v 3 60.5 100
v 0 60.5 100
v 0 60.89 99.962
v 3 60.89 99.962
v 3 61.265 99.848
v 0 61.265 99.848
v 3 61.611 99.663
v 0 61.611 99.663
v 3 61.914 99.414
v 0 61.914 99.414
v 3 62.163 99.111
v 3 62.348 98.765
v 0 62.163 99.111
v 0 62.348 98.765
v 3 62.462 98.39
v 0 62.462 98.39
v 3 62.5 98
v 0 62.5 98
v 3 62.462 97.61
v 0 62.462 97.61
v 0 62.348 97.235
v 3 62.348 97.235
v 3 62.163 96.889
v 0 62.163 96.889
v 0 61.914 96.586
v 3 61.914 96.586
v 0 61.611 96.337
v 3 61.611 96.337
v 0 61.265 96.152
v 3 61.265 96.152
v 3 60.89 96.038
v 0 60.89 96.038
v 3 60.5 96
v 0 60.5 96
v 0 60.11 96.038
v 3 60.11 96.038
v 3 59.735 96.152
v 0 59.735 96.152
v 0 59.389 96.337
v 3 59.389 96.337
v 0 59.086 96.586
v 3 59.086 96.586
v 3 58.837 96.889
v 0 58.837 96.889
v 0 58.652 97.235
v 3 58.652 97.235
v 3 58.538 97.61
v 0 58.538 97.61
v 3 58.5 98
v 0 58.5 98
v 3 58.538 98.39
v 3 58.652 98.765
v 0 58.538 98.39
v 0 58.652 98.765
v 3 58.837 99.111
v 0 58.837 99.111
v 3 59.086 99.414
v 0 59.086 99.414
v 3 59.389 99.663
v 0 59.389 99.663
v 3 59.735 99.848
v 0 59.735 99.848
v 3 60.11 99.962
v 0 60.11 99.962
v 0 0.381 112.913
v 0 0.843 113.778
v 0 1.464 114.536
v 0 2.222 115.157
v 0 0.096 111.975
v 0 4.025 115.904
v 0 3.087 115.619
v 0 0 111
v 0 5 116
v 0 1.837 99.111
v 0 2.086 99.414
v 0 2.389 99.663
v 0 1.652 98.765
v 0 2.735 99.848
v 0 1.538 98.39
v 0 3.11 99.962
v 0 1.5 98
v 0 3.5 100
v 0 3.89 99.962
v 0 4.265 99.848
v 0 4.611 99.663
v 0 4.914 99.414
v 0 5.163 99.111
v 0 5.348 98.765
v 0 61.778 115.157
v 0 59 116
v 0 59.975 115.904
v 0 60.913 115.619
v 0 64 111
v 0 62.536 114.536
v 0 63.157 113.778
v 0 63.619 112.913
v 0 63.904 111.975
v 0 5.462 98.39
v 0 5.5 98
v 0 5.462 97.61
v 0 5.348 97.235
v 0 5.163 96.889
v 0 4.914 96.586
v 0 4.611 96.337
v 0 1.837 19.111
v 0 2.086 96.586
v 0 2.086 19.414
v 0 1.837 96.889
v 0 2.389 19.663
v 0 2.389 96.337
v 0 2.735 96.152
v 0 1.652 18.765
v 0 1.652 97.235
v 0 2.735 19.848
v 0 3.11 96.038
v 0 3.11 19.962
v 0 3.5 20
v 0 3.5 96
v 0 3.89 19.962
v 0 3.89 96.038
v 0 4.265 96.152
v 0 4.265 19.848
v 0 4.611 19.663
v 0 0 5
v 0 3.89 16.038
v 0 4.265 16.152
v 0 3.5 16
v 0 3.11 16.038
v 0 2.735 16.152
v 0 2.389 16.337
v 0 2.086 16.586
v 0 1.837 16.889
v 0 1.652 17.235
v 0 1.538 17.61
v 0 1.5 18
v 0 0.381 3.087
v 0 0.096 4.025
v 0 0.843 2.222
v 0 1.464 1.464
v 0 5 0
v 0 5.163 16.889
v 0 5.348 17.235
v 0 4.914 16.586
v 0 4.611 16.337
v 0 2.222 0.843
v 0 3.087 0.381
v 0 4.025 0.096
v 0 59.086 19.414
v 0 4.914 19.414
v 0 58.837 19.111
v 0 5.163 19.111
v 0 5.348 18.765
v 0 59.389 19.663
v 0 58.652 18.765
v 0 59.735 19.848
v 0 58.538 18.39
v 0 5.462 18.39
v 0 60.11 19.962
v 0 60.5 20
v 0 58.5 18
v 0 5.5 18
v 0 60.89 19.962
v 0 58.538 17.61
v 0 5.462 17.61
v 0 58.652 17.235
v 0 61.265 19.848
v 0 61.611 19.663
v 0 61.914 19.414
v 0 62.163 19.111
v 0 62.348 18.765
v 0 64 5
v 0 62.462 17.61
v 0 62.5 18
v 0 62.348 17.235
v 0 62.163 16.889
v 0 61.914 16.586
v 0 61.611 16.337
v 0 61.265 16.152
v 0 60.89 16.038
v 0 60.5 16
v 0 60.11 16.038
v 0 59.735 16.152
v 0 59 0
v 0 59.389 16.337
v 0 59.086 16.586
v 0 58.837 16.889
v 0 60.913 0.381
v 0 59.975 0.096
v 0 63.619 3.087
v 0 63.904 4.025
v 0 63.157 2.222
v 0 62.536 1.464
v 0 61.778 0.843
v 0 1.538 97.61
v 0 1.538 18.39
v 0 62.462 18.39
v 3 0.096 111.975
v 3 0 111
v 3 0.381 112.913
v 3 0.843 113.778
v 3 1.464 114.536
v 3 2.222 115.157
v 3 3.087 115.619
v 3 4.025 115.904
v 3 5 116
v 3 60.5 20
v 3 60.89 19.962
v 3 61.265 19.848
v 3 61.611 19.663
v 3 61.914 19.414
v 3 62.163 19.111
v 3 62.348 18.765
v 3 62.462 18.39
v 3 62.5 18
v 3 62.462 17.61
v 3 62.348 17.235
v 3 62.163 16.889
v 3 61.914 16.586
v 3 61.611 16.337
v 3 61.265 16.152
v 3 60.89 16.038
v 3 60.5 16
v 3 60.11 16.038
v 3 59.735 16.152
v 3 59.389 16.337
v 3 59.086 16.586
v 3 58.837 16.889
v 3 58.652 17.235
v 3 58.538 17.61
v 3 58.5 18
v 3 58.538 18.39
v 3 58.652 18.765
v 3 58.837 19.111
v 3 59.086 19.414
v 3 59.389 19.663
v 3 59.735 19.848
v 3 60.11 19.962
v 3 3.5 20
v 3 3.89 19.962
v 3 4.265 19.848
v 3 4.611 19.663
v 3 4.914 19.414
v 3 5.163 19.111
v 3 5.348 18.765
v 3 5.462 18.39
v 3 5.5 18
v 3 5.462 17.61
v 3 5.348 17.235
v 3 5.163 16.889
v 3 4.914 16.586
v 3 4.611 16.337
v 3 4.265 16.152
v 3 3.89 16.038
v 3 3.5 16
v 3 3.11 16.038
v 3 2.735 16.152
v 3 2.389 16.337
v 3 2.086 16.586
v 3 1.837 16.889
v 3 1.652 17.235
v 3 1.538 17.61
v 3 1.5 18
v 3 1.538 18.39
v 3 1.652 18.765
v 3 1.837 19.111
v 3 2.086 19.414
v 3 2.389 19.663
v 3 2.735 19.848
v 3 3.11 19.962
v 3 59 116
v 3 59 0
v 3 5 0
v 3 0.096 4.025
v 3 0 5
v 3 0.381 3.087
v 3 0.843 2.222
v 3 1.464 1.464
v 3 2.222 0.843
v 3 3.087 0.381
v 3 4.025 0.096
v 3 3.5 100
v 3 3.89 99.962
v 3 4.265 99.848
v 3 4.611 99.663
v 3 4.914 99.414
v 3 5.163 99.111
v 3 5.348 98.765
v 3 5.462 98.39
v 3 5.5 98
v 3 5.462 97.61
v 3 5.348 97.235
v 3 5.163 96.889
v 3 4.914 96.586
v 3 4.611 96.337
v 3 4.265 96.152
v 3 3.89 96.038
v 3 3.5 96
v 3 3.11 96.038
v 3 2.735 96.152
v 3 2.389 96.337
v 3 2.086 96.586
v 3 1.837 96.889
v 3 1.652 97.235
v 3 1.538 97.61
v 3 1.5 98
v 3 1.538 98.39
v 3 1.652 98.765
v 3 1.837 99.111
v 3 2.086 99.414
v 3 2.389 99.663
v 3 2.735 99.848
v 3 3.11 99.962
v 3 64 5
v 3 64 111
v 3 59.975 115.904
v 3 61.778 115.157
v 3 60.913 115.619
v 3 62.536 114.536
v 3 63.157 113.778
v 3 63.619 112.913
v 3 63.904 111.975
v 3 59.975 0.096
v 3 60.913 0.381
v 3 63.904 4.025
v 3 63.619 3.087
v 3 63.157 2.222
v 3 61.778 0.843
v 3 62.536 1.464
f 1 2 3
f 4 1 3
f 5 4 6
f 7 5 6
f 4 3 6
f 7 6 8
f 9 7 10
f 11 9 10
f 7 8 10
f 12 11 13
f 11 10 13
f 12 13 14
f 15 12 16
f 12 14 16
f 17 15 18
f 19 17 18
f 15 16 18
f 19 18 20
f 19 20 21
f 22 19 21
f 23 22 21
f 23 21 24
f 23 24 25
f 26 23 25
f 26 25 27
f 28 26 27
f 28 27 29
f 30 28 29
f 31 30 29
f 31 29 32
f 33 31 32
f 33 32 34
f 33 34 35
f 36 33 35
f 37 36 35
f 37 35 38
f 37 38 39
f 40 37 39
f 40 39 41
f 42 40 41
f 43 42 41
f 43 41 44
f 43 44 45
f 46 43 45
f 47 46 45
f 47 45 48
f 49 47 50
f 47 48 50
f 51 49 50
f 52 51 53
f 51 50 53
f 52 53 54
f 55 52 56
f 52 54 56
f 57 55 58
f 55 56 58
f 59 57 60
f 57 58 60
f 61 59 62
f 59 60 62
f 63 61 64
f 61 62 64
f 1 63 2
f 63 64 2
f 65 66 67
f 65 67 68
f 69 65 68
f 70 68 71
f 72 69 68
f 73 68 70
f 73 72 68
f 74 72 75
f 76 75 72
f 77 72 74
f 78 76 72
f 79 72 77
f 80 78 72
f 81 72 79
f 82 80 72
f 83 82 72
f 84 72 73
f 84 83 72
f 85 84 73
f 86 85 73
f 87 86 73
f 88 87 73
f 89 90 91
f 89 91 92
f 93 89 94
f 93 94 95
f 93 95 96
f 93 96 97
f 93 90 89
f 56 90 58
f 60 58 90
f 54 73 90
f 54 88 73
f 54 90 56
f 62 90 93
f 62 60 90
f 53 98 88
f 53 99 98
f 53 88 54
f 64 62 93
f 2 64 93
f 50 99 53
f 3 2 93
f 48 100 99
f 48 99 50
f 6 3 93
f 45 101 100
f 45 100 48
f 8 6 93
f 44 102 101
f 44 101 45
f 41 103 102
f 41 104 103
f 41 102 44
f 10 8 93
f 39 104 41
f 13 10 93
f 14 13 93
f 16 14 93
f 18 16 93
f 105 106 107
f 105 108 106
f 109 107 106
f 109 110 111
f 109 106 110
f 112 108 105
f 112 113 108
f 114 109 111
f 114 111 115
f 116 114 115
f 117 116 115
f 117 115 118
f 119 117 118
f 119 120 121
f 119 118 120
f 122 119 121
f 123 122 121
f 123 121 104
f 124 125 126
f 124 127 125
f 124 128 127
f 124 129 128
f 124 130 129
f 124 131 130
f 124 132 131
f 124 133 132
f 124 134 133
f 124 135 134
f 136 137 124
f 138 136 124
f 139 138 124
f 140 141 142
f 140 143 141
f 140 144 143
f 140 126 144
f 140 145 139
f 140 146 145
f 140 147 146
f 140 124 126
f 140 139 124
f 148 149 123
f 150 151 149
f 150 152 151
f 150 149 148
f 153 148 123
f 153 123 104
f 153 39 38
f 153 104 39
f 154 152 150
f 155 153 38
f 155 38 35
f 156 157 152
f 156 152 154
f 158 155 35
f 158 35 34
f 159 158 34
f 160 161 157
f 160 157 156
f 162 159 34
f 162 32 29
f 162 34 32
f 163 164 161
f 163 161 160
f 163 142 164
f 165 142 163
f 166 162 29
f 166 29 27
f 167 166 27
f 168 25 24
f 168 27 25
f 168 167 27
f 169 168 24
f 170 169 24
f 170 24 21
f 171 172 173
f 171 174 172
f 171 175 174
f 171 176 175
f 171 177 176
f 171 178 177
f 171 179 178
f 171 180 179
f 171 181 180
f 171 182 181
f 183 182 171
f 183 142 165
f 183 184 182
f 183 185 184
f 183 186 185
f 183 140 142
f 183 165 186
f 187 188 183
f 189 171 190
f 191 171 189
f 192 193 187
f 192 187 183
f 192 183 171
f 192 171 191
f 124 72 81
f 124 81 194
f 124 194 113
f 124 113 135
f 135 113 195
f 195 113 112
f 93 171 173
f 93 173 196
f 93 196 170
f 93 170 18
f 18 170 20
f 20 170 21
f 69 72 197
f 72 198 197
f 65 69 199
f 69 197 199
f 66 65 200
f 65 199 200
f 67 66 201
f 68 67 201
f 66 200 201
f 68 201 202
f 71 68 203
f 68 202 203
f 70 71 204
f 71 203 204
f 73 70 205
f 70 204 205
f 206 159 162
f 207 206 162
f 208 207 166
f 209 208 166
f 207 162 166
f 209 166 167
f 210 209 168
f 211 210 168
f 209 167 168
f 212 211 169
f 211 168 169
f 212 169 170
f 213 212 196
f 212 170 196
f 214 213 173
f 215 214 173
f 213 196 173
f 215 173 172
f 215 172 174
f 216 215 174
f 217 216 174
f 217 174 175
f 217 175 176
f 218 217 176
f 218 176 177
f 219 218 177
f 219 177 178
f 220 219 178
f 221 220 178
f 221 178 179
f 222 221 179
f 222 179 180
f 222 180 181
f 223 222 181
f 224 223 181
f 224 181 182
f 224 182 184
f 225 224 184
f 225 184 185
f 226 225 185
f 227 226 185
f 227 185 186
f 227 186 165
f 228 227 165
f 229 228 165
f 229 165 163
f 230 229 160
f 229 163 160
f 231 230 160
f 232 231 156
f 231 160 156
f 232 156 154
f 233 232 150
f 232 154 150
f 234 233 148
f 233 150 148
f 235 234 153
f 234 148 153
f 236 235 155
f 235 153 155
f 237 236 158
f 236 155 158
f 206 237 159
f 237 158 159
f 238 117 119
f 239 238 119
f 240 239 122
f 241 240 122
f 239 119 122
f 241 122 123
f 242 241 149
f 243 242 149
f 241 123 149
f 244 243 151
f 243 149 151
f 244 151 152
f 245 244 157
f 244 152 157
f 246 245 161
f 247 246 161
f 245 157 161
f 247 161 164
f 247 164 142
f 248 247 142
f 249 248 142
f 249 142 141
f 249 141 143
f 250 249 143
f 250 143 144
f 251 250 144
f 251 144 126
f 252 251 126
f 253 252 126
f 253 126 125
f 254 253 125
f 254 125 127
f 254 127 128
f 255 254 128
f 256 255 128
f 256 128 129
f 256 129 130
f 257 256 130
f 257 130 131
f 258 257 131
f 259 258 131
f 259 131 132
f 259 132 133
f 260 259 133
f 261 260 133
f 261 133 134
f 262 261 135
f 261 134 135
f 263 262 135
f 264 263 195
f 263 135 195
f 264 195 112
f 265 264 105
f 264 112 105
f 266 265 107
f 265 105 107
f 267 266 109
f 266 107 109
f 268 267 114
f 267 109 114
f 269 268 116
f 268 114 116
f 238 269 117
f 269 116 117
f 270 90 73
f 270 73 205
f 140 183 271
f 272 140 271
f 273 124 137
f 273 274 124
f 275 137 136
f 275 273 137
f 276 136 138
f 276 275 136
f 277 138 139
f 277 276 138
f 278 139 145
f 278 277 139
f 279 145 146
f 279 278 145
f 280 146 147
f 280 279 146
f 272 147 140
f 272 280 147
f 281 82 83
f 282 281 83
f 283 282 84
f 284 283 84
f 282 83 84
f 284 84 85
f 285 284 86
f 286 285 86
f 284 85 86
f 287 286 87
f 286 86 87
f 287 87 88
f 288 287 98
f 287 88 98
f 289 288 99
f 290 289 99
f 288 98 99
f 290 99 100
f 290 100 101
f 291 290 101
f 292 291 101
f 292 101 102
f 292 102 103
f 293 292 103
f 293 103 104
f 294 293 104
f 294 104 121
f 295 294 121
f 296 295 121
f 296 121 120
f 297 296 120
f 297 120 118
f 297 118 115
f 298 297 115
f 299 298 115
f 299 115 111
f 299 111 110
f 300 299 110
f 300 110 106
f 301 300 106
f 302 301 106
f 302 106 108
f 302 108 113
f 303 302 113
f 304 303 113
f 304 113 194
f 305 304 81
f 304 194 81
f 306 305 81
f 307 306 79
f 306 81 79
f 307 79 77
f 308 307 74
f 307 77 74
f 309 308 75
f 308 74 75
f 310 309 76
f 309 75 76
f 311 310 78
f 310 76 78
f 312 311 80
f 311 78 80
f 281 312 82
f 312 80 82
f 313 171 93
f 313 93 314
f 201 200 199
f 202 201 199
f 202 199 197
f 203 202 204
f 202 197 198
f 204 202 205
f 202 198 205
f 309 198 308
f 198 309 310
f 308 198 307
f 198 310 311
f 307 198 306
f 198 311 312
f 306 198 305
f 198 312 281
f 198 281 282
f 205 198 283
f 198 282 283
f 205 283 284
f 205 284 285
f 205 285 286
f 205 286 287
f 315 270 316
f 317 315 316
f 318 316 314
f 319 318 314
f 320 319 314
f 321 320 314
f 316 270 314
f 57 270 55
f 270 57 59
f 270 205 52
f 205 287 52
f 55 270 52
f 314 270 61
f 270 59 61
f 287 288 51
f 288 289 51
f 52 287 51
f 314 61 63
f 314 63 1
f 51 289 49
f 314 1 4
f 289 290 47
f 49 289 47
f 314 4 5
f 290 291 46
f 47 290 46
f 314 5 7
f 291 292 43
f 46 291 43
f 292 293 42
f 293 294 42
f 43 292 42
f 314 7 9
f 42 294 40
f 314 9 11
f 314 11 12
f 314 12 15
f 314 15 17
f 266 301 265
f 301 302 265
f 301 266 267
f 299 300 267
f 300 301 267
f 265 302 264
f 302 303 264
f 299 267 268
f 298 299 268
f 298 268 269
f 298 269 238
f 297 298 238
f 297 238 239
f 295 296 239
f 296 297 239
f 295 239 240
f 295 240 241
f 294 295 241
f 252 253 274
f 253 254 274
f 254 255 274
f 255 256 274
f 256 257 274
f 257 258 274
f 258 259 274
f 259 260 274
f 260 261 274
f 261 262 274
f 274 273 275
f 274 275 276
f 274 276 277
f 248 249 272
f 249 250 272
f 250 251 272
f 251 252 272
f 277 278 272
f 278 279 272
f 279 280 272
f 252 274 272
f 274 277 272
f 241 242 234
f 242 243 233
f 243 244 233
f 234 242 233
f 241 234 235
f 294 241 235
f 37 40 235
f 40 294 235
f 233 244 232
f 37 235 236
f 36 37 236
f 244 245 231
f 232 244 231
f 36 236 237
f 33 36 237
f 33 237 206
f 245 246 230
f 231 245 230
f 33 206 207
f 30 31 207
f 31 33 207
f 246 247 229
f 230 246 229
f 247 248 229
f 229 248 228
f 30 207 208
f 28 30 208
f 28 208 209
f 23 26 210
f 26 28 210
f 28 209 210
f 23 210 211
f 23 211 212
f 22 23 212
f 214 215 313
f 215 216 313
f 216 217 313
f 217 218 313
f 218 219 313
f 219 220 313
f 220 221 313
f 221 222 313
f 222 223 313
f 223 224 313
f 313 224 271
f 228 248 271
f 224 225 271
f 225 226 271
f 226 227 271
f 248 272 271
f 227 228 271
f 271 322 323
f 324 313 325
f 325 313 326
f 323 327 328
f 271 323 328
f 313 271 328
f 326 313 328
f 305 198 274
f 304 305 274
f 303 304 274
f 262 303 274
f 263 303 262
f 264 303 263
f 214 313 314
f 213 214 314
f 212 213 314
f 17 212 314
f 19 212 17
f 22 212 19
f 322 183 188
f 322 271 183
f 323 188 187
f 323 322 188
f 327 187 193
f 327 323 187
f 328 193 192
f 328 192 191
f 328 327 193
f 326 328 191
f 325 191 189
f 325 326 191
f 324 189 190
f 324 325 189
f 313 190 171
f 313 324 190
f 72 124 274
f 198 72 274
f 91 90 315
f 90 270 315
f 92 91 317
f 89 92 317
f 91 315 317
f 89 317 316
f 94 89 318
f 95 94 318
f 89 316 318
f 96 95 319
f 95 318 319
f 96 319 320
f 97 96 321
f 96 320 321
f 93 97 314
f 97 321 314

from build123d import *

# Parameters (mm, degrees)
SKETCH1_W          = 3
SKETCH1_H          = 64
BASE_FLANGE1_DEPTH = 116
SKETCH3_R          = 2
CUT_EXTRUDE1_DEPTH = 10
FILLET1_R          = 5


# Sheet-metal steps are written as plain solids
with BuildPart() as part:
    # Sketch1 → Base-Flange1 (new body)
    with BuildSketch(Plane.XY):
        with Locations((1.5, 32)):
            Rectangle(SKETCH1_W, SKETCH1_H)
    extrude(amount=BASE_FLANGE1_DEPTH)

    # Sketch3 → Cut-Extrude1 (cut)
    with BuildSketch(Plane.ZY):
        with Locations((18, 60.5)):
            Circle(SKETCH3_R)
        with Locations((98, 60.5)):
            Circle(SKETCH3_R)
        with Locations((98, 3.5)):
            Circle(SKETCH3_R)
        with Locations((18, 3.5)):
            Circle(SKETCH3_R)
    extrude(amount=-CUT_EXTRUDE1_DEPTH, mode=Mode.SUBTRACT)

    # Fillet1
    fillet1_edges = [part.edges().sort_by_distance(p)[0] for p in [
        (1.5, 0, 116),
        (1.5, 0, 0),
        (1.5, 64, 0),
        (1.5, 64, 116),
    ]]
    fillet(fillet1_edges, radius=FILLET1_R)


solid = part.part
